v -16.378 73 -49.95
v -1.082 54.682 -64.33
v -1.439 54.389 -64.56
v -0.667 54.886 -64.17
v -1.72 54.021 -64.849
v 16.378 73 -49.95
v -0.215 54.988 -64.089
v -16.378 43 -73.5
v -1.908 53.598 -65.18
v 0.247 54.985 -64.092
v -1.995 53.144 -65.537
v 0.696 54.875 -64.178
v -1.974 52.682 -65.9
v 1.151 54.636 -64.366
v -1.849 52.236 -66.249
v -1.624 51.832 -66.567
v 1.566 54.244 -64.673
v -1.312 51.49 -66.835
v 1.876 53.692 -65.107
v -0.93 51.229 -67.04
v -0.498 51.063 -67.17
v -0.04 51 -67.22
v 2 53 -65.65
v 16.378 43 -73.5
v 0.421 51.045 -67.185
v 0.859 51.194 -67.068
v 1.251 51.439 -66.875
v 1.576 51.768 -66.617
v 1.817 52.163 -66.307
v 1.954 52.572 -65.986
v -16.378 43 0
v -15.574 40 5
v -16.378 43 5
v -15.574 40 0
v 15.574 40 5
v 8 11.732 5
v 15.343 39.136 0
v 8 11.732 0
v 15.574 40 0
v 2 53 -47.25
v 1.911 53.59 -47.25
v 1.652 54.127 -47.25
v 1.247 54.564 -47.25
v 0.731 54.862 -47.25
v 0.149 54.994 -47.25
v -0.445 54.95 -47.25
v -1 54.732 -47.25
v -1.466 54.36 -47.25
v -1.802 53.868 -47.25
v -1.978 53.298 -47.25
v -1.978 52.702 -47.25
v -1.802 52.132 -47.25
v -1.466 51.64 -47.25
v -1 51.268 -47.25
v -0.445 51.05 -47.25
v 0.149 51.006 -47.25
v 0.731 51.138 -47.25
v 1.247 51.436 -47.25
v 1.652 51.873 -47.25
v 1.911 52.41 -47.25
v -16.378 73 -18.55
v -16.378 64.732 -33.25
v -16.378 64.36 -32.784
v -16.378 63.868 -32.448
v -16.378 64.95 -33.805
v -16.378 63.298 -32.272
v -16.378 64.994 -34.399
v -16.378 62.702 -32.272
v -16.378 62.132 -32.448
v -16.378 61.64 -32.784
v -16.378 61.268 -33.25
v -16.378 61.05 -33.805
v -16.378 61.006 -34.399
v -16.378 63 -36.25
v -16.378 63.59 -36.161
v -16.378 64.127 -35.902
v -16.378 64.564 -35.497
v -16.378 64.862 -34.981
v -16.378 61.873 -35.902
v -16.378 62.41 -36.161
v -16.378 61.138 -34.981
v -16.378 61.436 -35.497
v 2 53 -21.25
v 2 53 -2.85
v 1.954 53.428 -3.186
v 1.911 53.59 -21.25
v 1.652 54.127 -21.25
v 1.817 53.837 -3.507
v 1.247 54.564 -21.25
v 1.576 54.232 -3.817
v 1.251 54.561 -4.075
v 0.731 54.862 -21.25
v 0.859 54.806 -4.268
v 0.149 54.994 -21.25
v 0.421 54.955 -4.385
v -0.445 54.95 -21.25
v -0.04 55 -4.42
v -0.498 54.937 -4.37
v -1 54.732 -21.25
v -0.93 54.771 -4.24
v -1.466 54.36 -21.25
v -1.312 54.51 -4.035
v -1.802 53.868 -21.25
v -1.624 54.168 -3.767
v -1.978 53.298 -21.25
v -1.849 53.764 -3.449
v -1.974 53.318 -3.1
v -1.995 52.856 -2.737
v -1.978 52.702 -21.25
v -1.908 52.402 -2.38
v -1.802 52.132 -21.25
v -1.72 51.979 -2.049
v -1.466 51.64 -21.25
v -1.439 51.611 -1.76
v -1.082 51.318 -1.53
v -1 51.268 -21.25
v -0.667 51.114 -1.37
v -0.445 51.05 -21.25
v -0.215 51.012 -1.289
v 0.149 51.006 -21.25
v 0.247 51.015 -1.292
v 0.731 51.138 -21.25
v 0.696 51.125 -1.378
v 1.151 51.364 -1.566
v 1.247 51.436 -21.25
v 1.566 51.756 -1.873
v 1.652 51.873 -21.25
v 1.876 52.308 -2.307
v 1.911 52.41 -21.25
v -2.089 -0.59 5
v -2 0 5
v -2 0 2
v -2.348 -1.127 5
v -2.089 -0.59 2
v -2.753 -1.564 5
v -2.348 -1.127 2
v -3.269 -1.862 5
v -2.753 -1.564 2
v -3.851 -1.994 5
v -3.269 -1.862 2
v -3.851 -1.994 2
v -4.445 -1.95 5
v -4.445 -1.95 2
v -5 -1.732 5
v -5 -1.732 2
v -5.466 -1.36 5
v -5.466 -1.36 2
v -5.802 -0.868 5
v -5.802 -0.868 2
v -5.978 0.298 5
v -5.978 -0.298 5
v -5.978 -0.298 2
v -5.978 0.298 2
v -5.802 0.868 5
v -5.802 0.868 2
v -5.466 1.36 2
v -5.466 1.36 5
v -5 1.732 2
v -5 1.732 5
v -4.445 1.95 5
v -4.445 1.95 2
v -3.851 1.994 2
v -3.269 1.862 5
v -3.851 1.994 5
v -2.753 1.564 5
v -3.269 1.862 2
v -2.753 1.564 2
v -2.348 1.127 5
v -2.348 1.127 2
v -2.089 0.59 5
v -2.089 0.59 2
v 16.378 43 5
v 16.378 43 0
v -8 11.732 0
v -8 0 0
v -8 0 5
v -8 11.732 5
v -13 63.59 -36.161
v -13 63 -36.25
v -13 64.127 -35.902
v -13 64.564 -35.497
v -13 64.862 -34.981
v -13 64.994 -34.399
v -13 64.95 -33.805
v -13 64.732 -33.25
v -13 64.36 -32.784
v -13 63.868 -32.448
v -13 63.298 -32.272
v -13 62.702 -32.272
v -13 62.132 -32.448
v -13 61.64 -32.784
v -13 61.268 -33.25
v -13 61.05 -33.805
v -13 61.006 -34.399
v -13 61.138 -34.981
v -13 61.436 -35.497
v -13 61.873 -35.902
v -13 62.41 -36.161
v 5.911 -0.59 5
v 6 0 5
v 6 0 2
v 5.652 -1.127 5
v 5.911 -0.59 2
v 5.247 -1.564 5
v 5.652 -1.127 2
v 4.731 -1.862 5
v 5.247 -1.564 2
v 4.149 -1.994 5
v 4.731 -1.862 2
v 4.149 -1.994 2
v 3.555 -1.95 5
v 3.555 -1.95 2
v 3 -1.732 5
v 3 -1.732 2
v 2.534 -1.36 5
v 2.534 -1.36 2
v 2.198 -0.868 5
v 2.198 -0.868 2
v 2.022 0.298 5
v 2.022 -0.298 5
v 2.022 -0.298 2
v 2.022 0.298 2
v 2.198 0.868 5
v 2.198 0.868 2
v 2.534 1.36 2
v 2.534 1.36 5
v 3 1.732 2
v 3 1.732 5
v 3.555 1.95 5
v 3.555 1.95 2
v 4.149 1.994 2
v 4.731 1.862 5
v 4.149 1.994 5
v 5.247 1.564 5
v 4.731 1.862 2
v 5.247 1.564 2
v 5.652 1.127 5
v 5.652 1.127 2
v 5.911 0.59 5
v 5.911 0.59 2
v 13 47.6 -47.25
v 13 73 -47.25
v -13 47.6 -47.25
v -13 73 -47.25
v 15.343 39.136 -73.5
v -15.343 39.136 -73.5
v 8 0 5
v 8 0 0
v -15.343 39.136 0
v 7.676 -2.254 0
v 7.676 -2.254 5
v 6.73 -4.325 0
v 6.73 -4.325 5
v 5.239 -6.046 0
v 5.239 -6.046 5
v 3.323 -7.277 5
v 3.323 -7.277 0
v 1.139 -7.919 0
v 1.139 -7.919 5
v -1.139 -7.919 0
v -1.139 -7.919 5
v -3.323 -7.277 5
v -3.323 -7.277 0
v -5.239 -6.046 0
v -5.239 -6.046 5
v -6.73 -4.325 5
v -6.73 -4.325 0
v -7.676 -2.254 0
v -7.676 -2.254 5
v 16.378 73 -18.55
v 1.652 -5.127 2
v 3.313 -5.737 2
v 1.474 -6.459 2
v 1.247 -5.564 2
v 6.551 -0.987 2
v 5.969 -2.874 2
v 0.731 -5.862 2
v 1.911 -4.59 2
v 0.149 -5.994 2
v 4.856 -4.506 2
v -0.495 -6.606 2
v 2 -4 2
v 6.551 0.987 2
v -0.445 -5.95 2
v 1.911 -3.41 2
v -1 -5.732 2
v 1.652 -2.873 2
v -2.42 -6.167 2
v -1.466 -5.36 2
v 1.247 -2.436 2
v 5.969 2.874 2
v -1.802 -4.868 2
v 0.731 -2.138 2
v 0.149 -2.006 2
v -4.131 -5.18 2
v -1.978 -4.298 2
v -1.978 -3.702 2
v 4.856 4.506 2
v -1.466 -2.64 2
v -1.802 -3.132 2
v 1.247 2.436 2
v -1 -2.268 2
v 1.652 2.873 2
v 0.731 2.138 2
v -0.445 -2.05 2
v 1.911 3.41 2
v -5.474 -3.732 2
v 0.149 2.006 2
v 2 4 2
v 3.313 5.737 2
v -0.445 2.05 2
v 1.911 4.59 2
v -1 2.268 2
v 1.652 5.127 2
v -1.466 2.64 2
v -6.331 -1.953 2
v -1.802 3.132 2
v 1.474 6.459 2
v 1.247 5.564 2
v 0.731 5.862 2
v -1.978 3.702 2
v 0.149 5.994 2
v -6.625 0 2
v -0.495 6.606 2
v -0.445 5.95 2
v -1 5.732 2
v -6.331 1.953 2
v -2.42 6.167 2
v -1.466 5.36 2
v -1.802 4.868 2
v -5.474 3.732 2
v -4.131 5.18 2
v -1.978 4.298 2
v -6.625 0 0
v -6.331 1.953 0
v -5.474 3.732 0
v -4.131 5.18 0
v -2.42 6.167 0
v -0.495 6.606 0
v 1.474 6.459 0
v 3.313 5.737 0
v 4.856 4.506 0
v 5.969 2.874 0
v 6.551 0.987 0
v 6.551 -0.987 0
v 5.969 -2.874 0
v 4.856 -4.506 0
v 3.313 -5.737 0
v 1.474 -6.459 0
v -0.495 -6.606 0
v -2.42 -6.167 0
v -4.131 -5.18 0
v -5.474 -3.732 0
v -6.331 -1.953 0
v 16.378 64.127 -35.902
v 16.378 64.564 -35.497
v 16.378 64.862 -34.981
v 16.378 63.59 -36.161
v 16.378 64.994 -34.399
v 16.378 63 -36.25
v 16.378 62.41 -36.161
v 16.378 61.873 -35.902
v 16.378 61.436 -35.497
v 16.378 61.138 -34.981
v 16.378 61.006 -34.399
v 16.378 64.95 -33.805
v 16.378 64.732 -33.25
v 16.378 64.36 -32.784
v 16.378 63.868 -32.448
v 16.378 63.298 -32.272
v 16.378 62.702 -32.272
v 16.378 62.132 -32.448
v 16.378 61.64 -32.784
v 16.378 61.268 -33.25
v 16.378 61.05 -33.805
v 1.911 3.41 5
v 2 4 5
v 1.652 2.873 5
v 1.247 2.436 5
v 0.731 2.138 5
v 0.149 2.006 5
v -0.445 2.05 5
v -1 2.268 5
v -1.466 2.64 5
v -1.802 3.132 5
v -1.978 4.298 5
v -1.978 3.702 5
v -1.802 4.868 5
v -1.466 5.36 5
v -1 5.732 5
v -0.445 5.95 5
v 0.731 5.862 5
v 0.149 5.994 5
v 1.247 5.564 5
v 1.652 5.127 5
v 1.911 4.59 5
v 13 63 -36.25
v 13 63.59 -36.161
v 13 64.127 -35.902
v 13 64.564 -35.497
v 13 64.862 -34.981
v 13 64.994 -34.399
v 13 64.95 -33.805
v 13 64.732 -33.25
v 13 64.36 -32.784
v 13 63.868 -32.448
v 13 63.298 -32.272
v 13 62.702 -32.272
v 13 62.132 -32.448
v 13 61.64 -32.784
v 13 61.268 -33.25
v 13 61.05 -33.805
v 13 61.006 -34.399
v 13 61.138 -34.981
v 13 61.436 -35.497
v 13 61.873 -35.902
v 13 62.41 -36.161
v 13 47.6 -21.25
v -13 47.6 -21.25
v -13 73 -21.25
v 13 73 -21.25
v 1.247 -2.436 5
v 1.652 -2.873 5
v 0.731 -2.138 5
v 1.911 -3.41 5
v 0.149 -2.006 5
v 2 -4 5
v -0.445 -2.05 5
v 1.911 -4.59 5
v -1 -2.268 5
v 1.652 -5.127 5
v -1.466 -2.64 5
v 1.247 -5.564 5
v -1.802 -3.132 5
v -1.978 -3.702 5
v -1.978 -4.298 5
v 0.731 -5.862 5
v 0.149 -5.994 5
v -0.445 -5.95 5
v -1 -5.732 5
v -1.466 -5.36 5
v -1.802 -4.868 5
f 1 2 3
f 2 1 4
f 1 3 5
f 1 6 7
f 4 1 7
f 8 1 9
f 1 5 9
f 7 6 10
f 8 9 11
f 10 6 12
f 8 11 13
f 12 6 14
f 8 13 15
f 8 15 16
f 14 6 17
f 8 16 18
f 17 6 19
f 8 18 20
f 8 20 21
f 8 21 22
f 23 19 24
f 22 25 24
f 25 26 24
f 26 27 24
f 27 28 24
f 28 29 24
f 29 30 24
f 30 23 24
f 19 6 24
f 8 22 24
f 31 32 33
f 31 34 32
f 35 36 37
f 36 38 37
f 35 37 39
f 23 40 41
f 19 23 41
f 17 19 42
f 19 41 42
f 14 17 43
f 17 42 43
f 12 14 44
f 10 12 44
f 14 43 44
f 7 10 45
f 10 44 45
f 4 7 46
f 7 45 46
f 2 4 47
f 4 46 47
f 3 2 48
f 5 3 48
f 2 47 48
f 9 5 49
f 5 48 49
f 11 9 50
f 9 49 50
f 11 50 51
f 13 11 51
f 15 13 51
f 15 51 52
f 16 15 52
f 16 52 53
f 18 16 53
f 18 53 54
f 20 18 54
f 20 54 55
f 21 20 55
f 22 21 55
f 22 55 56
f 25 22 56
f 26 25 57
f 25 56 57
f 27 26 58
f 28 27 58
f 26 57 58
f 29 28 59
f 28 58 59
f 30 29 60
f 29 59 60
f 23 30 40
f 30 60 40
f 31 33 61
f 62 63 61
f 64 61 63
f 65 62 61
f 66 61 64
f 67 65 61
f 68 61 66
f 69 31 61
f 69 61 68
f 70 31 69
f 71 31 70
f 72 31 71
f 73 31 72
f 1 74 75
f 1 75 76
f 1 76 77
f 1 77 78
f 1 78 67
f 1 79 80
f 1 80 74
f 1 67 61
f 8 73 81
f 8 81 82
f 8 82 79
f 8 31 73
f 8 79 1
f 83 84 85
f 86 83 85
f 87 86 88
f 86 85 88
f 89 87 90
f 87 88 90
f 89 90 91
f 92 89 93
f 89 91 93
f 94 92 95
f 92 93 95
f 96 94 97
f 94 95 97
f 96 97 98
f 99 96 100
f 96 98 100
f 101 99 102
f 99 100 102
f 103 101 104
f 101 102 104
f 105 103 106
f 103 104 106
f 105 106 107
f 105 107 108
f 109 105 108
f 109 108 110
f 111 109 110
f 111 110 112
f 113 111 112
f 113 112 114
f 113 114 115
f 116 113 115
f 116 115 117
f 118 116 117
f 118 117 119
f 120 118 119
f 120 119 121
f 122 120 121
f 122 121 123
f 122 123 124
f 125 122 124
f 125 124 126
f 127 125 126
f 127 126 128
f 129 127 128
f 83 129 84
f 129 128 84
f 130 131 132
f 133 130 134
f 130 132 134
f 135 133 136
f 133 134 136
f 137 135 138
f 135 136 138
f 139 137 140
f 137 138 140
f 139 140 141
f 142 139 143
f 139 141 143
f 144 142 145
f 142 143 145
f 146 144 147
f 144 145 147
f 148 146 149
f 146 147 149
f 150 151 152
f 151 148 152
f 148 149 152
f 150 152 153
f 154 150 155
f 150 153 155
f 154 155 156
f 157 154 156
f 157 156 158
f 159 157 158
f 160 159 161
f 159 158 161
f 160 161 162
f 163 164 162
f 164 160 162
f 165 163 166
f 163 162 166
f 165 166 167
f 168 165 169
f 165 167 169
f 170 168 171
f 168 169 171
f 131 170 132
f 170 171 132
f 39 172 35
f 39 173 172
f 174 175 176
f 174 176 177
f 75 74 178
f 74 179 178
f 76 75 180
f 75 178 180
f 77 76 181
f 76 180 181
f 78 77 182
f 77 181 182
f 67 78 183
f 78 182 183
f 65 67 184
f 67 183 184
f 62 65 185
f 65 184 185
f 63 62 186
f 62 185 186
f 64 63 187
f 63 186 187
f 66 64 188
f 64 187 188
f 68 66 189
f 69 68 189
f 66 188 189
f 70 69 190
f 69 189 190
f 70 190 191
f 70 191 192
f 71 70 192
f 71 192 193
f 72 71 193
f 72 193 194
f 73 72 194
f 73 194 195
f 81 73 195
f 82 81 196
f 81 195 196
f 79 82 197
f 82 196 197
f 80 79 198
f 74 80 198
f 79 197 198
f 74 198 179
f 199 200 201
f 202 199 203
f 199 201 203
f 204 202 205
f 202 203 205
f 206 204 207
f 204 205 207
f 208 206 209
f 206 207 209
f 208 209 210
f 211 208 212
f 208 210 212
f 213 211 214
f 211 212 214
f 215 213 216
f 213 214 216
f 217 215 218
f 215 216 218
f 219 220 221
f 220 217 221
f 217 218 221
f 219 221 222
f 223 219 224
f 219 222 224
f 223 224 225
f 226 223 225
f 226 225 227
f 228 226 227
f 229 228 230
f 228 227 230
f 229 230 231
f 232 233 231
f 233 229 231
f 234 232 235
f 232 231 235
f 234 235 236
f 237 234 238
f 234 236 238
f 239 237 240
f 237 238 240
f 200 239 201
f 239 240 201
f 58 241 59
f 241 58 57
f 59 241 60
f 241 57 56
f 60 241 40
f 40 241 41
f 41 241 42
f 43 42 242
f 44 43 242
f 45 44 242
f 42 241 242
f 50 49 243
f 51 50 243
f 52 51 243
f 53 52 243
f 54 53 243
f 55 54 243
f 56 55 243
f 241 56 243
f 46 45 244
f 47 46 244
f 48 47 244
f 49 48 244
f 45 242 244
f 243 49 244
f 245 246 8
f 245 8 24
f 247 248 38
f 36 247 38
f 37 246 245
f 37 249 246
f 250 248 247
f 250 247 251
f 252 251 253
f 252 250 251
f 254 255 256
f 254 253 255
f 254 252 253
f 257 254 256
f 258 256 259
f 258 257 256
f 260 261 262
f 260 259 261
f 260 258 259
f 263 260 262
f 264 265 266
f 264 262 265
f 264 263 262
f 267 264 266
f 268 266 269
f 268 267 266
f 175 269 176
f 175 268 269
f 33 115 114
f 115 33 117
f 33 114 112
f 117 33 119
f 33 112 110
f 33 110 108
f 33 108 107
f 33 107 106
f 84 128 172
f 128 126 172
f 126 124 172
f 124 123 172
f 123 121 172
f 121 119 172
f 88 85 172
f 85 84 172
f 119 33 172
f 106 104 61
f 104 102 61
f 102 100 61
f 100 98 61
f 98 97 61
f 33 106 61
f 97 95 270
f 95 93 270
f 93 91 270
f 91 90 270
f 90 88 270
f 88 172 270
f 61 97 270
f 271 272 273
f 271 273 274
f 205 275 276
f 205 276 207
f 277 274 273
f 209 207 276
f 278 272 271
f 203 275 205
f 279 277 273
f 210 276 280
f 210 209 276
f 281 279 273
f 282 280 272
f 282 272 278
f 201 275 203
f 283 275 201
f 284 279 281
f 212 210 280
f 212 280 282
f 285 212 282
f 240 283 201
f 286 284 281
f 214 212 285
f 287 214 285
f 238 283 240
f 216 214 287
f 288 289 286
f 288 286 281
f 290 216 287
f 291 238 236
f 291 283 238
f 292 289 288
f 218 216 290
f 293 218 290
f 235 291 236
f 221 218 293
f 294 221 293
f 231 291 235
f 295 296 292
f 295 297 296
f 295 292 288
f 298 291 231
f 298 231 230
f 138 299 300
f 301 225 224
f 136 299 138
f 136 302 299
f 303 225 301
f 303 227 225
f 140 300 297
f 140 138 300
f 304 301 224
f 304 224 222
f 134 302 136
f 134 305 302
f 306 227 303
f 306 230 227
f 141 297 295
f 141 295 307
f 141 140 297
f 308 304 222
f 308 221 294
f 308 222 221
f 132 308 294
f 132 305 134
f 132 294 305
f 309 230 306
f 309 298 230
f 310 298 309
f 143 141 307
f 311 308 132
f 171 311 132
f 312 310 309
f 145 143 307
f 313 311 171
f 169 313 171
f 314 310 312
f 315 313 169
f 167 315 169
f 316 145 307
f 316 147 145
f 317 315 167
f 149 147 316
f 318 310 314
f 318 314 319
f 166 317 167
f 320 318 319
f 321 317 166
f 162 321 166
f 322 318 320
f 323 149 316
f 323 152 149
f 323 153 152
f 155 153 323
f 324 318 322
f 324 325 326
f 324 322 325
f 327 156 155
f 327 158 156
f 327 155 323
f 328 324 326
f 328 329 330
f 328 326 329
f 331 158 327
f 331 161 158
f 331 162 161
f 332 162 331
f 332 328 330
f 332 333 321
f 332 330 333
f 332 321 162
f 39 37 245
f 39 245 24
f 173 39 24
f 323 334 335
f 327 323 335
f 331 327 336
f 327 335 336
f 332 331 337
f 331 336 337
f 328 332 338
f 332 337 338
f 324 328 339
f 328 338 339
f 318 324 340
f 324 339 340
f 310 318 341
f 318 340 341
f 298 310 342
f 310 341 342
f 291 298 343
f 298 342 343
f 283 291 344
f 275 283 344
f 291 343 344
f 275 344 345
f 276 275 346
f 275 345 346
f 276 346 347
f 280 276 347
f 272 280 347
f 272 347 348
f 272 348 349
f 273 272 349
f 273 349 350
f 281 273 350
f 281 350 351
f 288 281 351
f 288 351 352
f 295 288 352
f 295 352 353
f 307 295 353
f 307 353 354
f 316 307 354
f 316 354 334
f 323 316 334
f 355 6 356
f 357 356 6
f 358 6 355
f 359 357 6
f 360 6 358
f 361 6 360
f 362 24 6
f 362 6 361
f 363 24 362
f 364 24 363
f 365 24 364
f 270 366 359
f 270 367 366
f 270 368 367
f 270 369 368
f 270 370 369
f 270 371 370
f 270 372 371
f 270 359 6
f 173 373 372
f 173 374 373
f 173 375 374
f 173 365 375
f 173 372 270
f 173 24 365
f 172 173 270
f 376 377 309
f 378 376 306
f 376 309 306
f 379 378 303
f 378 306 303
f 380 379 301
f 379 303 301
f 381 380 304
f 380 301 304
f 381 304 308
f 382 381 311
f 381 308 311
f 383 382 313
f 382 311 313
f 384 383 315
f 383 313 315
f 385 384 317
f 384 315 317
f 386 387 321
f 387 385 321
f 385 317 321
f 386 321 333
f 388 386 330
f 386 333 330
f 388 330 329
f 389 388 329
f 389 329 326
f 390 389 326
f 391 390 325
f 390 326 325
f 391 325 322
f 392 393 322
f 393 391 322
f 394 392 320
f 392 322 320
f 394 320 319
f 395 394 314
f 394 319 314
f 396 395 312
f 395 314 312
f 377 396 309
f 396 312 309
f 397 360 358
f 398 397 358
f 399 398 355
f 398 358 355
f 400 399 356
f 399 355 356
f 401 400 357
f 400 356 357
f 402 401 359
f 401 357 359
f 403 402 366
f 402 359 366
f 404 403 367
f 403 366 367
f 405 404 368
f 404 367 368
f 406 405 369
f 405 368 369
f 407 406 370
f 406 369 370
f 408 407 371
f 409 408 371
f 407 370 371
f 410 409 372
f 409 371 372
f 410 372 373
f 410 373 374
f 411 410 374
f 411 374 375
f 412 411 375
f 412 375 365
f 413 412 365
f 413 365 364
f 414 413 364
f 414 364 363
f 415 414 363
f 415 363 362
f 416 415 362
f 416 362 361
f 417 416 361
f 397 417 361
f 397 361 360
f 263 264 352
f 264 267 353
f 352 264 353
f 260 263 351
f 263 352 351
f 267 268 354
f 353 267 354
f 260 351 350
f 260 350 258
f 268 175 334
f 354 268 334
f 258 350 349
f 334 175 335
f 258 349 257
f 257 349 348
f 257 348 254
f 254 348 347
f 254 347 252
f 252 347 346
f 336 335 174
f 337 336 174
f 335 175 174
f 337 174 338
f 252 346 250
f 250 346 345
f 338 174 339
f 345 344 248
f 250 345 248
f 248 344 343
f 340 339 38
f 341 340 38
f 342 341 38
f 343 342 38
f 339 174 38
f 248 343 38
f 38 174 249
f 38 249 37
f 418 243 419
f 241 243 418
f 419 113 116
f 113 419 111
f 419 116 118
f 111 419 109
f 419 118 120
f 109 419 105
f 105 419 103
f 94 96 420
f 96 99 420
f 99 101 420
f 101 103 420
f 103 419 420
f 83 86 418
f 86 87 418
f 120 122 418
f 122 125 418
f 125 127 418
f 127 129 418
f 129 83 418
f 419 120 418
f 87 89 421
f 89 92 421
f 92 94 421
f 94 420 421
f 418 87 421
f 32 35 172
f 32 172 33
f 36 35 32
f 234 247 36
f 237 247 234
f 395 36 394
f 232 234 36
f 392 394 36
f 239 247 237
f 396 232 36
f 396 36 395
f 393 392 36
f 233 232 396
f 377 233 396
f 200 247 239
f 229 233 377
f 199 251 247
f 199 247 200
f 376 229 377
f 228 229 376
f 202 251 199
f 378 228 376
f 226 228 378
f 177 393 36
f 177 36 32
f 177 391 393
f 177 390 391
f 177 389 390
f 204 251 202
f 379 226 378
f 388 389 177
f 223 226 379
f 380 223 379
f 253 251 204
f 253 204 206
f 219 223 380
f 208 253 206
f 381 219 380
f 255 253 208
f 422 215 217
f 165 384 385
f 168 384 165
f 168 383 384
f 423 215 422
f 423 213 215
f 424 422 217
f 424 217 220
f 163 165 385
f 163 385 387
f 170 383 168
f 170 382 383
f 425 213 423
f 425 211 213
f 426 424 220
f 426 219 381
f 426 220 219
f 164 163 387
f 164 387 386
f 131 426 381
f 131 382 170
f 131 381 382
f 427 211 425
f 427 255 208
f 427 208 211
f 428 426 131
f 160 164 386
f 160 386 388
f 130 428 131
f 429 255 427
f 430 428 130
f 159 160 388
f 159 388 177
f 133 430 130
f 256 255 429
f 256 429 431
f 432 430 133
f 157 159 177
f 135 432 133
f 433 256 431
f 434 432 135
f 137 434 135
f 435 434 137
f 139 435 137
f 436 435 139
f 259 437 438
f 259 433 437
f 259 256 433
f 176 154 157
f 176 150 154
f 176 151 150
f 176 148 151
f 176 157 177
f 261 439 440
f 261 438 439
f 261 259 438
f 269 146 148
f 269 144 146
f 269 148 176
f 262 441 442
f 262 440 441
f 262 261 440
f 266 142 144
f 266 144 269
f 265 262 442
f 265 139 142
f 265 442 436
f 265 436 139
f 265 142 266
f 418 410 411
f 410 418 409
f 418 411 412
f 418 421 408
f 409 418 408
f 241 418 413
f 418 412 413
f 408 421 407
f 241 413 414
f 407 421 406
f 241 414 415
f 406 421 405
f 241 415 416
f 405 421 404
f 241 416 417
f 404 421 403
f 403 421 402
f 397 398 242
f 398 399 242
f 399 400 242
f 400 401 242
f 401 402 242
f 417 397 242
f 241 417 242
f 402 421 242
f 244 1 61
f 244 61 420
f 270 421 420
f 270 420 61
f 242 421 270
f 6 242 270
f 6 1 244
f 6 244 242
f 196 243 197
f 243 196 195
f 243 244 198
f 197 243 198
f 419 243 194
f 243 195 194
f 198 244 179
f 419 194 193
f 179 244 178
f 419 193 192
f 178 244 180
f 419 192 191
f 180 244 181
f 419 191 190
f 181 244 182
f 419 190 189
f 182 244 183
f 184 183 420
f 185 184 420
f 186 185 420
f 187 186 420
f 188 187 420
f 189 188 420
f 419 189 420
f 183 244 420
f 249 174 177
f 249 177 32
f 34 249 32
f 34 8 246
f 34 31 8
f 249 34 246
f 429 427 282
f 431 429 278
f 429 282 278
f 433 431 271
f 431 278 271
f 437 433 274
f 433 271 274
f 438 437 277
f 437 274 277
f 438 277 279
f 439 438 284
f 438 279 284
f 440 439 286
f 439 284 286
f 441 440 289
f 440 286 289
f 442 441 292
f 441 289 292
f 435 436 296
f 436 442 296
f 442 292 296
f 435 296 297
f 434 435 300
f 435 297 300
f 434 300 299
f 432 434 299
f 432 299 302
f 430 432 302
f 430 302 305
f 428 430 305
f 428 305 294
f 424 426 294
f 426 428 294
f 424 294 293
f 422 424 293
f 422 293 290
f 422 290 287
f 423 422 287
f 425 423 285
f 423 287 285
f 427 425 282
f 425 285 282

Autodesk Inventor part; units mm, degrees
ref_plane "YZ Plane" through (0, 0, 0) normal (1, 0, 0) x (0, 1, 0)
ref_plane "XZ Plane" through (0, 0, 0) normal (0, 1, 0) x (-1, 0, 0)
sketch "Sketch1" plane through (0, 0, 0) normal (0, 0, 1) x (1, 0, 0)
  circle A0 centre (0, 4) radius 2
  circle A1 centre (-4, 0) radius 2
  circle A2 centre (0, -4) radius 2
  circle A3 centre (4, 0) radius 2
  line L0 (8, 11.7321) -> (15.5744, 40)
  line L1 (7, 8) -> (40.1288, 8) construction
  line L2 (-8, 11.7321) -> (-15.5744, 40)
  line L3 (8, 0) -> (8, 11.7321)
  line L4 (-8, 0) -> (-8, 11.7321)
  arc A4 (-8, 0) -> (8, 0) centre (0, 0) ccw
  line L5 (0, 43) -> (16.3782, 43)
  line L6 (16.3782, 43) -> (15.5744, 40)
  line L7 (-15.5744, 40) -> (-16.3782, 43)
  line L8 (-16.3782, 43) -> (0, 43)
  dimension "d2" = 4
  dimension "d5" = 360
extrude "Extrusion1" add sketch "Sketch1" along normal blind 5
sketch "Sketch2" plane through (0, 0, 0) normal (0, 0, -1) x (-1, 0, 0)
  circle A0 centre (0, 0) radius 6.625
  dimension "d18" = 13.25
extrude "Extrusion2" cut sketch "Sketch2" against normal blind 2
sketch "Sketch4" plane through (0, 0, 0) normal (0, 0, -1) x (-1, 0, 0)
  line L0 (-8, 11.7321) -> (-16.3782, 43) projected
  line L1 (-16.3782, 43) -> (16.3782, 43) projected
  line L2 (-16.3782, 43) -> (16.3782, 43)
  line L3 (0, 39.136) -> (15.3429, 39.136)
  line L4 (16.3782, 43) -> (8, 11.7321) projected
  line L5 (15.3429, 39.136) -> (16.3782, 43)
  line L6 (0, 39.136) -> (-15.3429, 39.136)
  line L7 (-15.3429, 39.136) -> (-16.3782, 43)
  point P0 (0, 0)
extrude "Extrusion4" add sketch "Sketch4" along normal blind 73.5
sketch "Sketch5" plane through (-16.3782, 43, 5) normal (0, 1, 0) x (1, 0, 0)
  line L0 (0, 78.5) -> (32.7564, 78.5) projected
  line L1 (32.7564, 0) -> (0, 0) projected
  line L2 (0, 78.5) -> (32.7564, 78.5)
  line L3 (32.7564, 78.5) -> (32.7564, 0)
  line L4 (32.7564, 0) -> (0, 0)
  line L5 (0, 0) -> (0, 78.5)
  point P0 (16.3782, 5)
extrude "Extrusion5" add sketch "Sketch5" along normal blind 30
sketch "Sketch6" plane through (16.3782, 43, -73.5) normal (1, 0, 0) x (0, 0, -1)
  line L0 (-78.5, 30) -> (0, 30) projected
  line L1 (-39.25, 30) -> (-26.55, 30)
  line L2 (-39.25, 30) -> (-51.95, 30)
  line L3 (-51.95, 30) -> (-54.95, 30)
  line L4 (-26.55, 30) -> (-23.55, 30)
  line L5 (0, -3.864) -> (0, 0) projected
  line L6 (-23.55, 30) -> (0, 0)
  line L7 (0, 0) -> (0, 30) projected
  line L8 (0, 0) -> (0, 30)
  line L9 (0, 30) -> (-23.55, 30)
  line L10 (-54.95, 30) -> (-78.5, 30)
  line L11 (-78.5, 0) -> (-78.5, 30) projected
  line L12 (-78.5, 30) -> (-78.5, 0)
  line L13 (-78.5, 0) -> (-54.95, 30)
  point P0 (-73.5, -43)
  dimension "d30" = 12.7
  dimension "d31" = 12.7
  dimension "d32" = 3
  dimension "d33" = 3
extrude "Extrusion6" cut sketch "Sketch6" against normal up to surface (32.7564 mm away)
sketch "Sketch7" plane through (-16.3782, 73, 5) normal (0, 1, 0) x (1, 0, 0)
  line L0 (0, 78.5) -> (0, 0) projected
  line L1 (0, 23.55) -> (32.7564, 23.55) projected
  line L2 (16.3782, 52.25) -> (3.3782, 52.25)
  line L3 (3.3782, 52.25) -> (3.3782, 26.25)
  line L4 (3.3782, 26.25) -> (29.3782, 26.25)
  line L5 (29.3782, 26.25) -> (29.3782, 52.25)
  line L6 (29.3782, 52.25) -> (16.3782, 52.25)
  point P0 (16.3782, 5)
  dimension "d37" = 13
  dimension "d38" = 26
  dimension "d39" = 26
extrude "Extrusion7" cut sketch "Sketch7" against normal blind 25.4
ref_plane "Work Plane1" through (0, 0, 2.5) normal (0, 0, 1) x (1, 0, 0)
sketch "Sketch8" plane through (0, 0, 2.5) normal (0, 0, 1) x (1, 0, 0)
  line L0 (16.3782, 43) -> (-16.3782, 43) projected
  circle A0 centre (0, 53) radius 2
  point P0 (0, 0)
  dimension "d43" = 4
extrude "Extrusion8" cut sketch "Sketch8" against normal through all
sketch "Sketch9" plane through (16.3782, 43, 5) normal (1, 0, 0) x (0, 0, -1)
  line L0 (26.25, 30) -> (52.25, 30) projected
  circle A0 centre (39.25, 20) radius 2
  point P0 (5, -43)
  dimension "d47" = 4
extrude "Extrusion9" cut sketch "Sketch9" against normal up to surface (32.7564 mm away)
properties part number "OutPut_Shaft_From_Gearbox"
